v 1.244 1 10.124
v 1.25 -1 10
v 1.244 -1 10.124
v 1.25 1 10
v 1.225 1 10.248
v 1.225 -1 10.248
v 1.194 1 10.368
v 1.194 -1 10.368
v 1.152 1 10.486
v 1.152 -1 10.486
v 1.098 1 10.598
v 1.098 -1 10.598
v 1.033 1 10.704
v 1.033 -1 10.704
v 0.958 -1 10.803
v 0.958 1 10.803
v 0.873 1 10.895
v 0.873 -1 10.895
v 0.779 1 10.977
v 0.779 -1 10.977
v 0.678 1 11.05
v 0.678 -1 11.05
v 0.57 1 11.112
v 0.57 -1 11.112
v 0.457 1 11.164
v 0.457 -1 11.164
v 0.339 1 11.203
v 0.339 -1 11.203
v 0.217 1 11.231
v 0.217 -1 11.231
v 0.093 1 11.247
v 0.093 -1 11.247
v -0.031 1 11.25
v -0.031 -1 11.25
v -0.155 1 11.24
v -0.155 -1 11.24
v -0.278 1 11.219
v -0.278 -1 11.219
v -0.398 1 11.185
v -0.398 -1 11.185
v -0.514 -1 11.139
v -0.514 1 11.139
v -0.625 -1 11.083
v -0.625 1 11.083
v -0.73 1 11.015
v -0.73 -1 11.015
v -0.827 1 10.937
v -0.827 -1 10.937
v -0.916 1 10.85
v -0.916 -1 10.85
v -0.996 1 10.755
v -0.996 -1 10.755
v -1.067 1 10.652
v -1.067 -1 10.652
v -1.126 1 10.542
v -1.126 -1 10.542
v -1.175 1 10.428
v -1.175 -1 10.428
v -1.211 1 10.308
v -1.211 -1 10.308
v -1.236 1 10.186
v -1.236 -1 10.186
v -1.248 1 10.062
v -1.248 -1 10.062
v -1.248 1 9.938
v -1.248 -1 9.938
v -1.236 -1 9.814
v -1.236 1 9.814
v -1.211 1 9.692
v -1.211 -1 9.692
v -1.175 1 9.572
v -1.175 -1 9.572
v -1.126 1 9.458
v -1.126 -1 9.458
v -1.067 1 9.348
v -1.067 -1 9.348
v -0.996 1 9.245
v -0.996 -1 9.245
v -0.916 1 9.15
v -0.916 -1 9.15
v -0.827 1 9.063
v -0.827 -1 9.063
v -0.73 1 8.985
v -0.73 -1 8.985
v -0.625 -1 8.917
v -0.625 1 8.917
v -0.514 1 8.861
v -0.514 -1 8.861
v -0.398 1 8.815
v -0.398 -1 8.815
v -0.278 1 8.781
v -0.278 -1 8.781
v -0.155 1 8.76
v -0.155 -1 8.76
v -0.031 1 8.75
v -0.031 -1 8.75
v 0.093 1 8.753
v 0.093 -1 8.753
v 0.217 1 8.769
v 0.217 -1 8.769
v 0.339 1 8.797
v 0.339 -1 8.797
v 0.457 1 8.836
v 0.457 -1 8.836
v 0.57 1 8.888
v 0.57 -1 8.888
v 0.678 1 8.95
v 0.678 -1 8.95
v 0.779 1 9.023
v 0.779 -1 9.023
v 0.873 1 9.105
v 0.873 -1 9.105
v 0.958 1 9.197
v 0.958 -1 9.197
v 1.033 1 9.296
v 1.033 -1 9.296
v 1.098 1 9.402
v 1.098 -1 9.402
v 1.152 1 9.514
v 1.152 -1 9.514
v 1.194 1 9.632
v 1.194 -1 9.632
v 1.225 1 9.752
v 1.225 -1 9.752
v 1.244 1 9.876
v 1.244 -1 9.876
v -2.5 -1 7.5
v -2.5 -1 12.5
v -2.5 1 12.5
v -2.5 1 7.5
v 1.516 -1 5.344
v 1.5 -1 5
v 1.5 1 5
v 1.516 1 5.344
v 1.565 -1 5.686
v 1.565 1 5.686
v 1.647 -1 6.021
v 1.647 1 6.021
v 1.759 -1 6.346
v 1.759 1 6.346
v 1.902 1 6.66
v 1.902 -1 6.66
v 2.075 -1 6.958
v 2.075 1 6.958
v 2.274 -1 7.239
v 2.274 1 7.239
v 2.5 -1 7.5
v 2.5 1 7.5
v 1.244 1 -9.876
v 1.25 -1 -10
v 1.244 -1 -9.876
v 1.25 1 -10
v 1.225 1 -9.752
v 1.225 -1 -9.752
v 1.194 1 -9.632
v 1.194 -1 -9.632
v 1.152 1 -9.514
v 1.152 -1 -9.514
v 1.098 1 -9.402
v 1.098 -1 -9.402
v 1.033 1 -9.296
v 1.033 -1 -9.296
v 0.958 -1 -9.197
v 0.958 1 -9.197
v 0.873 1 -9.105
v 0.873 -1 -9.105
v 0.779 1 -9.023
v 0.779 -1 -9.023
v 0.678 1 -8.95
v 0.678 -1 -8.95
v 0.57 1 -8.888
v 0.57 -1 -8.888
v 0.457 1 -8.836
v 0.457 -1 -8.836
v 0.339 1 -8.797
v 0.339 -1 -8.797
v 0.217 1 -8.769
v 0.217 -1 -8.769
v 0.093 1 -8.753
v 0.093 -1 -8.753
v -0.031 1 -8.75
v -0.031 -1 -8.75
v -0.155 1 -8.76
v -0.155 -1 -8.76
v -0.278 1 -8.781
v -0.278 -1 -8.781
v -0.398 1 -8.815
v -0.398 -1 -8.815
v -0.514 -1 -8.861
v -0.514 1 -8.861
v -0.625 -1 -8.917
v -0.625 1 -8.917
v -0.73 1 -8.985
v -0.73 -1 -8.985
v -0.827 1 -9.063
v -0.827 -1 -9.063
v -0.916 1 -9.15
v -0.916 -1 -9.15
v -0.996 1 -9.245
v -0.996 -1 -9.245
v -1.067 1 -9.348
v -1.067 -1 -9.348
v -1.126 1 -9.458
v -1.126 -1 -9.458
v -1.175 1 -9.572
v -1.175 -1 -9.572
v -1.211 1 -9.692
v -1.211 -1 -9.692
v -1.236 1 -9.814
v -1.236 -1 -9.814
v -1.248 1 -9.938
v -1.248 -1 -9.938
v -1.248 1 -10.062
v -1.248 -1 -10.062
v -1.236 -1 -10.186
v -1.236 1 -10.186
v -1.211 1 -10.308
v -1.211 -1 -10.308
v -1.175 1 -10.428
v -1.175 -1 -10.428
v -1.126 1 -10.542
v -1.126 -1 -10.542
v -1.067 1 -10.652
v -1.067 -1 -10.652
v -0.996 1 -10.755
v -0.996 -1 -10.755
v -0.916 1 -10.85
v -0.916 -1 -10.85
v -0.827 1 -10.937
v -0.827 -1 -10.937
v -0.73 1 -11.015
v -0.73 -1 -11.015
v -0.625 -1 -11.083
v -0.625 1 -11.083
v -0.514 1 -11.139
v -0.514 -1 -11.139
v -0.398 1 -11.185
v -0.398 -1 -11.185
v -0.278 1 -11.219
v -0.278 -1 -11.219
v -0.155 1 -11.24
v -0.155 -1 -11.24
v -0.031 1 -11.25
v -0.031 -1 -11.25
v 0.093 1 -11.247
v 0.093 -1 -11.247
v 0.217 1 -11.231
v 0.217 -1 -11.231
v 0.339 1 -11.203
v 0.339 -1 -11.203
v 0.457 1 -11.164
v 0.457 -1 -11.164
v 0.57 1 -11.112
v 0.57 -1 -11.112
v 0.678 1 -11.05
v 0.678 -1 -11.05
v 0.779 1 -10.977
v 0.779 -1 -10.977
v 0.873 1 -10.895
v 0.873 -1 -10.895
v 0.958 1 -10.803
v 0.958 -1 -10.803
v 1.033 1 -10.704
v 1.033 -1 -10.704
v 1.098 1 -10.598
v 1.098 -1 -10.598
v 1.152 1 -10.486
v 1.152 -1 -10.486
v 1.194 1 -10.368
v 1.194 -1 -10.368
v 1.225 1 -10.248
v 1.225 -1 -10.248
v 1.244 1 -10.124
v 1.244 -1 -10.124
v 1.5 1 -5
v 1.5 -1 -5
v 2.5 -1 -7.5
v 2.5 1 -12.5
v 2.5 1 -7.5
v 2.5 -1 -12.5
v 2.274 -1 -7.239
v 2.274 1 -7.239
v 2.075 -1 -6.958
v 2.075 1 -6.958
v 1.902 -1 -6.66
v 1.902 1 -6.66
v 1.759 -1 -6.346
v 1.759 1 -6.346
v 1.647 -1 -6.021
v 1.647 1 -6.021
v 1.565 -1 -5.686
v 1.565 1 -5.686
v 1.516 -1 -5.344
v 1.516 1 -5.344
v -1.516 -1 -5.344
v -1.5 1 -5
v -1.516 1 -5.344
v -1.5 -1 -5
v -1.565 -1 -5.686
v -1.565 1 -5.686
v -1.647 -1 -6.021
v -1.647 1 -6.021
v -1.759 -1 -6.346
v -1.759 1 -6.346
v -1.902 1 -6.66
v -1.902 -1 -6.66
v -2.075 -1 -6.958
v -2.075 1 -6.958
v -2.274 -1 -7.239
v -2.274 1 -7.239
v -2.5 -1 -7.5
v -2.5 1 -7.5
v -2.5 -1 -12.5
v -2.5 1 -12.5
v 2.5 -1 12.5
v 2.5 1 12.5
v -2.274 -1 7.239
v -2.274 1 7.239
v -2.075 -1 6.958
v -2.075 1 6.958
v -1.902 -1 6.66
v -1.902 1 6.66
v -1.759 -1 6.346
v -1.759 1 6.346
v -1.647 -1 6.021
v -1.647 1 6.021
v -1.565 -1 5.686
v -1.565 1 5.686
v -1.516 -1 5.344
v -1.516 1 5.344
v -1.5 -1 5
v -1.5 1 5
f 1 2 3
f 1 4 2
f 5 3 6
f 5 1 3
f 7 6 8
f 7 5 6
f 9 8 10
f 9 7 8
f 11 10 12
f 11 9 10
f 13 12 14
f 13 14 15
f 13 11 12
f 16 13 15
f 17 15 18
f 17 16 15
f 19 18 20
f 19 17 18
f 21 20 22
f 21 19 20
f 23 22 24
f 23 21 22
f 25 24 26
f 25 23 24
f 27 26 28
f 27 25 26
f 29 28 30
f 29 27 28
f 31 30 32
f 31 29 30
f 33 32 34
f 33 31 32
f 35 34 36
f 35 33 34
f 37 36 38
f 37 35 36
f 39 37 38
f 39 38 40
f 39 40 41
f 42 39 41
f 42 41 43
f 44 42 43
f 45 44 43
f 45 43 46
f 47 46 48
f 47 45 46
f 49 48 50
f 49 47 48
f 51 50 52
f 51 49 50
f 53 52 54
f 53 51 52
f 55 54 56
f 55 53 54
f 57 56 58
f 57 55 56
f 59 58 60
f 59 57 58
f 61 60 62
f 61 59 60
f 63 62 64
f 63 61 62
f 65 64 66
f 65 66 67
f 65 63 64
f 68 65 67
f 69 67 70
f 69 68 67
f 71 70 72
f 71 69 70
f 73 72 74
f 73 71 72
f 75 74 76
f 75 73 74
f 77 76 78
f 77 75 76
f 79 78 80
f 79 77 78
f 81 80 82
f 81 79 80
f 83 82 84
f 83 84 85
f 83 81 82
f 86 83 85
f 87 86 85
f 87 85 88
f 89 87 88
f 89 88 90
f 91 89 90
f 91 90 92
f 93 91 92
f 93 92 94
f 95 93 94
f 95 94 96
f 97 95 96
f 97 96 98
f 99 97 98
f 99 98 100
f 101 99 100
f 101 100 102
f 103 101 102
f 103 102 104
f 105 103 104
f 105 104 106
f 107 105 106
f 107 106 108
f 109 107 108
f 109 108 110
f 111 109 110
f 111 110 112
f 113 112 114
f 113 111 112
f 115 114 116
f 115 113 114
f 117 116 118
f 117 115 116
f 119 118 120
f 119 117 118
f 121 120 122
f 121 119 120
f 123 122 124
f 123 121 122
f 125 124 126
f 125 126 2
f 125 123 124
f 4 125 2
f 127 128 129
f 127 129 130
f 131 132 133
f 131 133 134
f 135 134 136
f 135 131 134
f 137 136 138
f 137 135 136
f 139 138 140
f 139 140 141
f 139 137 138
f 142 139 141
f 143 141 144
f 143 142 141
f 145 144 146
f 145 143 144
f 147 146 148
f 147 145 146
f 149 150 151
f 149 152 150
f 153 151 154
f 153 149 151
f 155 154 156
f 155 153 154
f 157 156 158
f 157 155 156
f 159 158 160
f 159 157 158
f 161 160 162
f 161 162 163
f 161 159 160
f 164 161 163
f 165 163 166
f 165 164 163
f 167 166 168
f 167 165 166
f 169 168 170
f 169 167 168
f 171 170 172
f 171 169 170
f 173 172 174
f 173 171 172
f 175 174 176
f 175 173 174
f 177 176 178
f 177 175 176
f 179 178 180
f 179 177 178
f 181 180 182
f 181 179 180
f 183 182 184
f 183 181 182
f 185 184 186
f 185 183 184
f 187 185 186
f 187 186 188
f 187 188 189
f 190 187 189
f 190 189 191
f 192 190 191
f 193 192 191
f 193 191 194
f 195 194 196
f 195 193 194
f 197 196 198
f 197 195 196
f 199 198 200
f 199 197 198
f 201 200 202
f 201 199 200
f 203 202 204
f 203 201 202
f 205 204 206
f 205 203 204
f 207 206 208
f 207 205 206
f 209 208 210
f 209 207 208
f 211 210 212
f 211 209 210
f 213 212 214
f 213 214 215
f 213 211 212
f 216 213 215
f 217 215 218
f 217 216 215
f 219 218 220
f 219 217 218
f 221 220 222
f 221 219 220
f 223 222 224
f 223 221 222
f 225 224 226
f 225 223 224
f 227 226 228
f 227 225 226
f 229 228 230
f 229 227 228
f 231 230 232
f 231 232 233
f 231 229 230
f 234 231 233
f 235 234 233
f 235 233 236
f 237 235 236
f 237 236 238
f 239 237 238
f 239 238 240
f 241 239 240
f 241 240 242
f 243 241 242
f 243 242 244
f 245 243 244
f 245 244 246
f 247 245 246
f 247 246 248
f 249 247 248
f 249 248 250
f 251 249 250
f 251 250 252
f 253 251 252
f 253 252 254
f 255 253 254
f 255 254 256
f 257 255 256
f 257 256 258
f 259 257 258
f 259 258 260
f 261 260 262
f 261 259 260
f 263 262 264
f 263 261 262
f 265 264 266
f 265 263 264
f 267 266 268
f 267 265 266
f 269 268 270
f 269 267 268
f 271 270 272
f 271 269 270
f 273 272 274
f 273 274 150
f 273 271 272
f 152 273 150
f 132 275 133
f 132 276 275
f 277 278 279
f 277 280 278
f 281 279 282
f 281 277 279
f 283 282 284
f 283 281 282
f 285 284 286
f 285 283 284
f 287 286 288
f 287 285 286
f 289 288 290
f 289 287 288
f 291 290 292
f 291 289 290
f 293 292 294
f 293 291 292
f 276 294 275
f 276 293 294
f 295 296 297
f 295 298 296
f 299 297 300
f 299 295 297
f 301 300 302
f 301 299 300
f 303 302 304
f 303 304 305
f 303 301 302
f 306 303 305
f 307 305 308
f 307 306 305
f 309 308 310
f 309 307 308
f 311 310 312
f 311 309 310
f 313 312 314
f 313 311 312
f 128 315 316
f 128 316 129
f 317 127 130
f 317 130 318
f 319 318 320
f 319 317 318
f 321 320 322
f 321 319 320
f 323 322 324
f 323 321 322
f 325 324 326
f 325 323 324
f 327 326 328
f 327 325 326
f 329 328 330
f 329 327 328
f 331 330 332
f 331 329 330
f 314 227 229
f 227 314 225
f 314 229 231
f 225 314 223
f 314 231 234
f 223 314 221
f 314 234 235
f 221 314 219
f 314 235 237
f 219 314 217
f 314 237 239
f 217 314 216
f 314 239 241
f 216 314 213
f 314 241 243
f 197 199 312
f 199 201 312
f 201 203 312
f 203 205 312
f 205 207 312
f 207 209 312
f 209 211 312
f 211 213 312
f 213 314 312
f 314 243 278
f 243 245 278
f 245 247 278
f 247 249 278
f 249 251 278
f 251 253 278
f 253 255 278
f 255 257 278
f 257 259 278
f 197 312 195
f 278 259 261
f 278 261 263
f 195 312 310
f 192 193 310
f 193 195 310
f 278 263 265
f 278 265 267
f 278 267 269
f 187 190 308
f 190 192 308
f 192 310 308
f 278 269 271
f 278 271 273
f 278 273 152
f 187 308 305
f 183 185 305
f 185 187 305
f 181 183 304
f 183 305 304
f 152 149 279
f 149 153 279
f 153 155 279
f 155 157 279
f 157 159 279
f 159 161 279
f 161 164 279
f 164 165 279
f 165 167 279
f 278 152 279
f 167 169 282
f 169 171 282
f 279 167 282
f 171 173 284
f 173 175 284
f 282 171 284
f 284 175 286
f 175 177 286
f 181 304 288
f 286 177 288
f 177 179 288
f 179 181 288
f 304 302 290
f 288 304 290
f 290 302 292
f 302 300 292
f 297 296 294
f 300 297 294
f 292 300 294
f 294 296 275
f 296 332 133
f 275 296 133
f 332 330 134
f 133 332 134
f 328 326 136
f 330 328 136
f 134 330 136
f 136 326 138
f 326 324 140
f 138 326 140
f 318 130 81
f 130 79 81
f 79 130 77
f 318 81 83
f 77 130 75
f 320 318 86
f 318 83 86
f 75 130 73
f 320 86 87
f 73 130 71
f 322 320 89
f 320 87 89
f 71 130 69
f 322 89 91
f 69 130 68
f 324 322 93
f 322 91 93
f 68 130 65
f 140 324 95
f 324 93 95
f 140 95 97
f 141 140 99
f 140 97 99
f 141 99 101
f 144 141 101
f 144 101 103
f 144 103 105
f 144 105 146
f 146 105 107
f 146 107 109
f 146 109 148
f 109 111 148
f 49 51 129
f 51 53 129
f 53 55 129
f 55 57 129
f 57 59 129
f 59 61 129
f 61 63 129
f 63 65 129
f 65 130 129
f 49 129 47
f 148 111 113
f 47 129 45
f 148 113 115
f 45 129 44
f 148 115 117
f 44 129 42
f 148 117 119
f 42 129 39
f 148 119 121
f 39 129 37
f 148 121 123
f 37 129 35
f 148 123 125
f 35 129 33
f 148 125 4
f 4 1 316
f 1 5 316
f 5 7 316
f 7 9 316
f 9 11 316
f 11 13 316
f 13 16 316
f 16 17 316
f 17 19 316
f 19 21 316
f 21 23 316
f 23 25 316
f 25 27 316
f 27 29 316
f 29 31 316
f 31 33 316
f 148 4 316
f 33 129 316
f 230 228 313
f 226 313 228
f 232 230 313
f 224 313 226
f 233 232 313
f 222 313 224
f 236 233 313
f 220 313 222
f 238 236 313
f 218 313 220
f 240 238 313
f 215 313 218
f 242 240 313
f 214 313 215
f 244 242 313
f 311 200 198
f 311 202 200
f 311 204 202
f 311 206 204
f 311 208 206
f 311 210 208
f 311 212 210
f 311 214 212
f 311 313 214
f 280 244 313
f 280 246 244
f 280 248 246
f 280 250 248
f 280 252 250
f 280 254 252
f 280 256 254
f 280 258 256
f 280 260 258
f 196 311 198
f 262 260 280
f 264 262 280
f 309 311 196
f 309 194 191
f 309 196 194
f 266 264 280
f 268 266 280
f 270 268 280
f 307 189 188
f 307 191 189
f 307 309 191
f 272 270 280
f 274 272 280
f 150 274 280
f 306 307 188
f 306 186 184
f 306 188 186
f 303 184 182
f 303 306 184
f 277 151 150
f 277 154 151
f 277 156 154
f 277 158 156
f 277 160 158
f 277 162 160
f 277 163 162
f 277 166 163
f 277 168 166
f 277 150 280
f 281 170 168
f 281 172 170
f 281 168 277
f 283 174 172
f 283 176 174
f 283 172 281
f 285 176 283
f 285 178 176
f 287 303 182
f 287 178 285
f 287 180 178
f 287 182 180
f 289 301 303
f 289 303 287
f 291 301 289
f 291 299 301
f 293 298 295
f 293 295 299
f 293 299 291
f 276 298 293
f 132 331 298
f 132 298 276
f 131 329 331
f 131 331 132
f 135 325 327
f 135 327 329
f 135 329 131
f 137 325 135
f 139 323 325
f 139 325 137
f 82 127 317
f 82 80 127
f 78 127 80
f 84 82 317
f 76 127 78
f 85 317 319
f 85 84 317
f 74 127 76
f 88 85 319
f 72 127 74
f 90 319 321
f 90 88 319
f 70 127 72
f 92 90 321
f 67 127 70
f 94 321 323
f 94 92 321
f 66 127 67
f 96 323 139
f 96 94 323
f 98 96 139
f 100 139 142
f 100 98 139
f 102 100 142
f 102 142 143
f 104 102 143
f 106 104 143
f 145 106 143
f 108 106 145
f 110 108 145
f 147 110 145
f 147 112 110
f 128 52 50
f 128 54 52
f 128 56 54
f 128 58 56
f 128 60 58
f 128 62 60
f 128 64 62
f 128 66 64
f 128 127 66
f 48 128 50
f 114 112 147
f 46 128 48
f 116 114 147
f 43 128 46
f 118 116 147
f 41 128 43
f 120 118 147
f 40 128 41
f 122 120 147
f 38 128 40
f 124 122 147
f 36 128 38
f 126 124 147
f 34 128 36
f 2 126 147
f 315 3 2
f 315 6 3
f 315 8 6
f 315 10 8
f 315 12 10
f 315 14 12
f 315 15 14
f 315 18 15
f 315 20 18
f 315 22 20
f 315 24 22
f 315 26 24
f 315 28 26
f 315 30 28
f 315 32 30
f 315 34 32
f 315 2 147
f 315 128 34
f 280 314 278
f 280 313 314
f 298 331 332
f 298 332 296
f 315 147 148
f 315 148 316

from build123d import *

# Parameters (mm, degrees)
F0_R     = 1.25
F1_DEPTH = 1


with BuildPart() as f1:
    # F0 (on Front) → F1 (new body, symmetric)
    with BuildSketch(Plane.XZ):
        with BuildLine():
            Line((1.5, -5), (1.5, 0))
            Line((1.5, 0), (1.5, 5))
            ThreePointArc((1.5, 5), (1.7592719955, 6.3462912018), (2.5, 7.5))
            Line((2.5, 7.5), (2.5, 12.5))
            Line((2.5, 12.5), (0, 12.5))
            Line((0, 12.5), (-2.5, 12.5))
            Line((-2.5, 12.5), (-2.5, 7.5))
            ThreePointArc((-2.5, 7.5), (-1.7592719955, 6.3462912018), (-1.5, 5))
            Line((-1.5, 5), (-1.5, 0))
            Line((-1.5, 0), (-1.5, -5))
            ThreePointArc((-1.5, -5), (-1.7592719955, -6.3462912018), (-2.5, -7.5))
            Line((-2.5, -7.5), (-2.5, -12.5))
            Line((-2.5, -12.5), (0, -12.5))
            Line((0, -12.5), (2.5, -12.5))
            Line((2.5, -12.5), (2.5, -7.5))
            ThreePointArc((2.5, -7.5), (1.7592719955, -6.3462912018), (1.5, -5))
        make_face()
        with Locations((0, -10)):
            Circle(F0_R, mode=Mode.SUBTRACT)
        with Locations((0, 10)):
            Circle(F0_R, mode=Mode.SUBTRACT)
    extrude(amount=F1_DEPTH, both=True)


solid = f1.part
